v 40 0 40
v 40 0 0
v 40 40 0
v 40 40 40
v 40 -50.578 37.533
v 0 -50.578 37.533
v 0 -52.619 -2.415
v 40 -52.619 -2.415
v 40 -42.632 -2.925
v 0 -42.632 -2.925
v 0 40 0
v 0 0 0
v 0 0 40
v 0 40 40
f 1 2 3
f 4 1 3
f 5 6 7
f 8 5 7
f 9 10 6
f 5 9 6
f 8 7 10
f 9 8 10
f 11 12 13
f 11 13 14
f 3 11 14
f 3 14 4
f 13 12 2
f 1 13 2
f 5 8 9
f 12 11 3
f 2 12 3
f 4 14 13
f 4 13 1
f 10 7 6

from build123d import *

# Parameters (mm, degrees)
F0_W     = 40
F0_H     = 40
F1_DEPTH = 40
F3_DEPTH = 40


with BuildPart() as f1:
    # F0 (on Top) → F1 (new body)
    with BuildSketch(Plane.XY):
        with Locations((20, 20)):
            Rectangle(F0_W, F0_H)
    extrude(amount=F1_DEPTH)


with BuildPart() as f3:
    # F2 (on Right) → F3 (new body)
    with BuildSketch(Plane.YZ):
        Polygon((-42.632059, -2.924834), (-50.577897, 37.533338), (-52.619031, -2.41455), align=None)
    extrude(amount=F3_DEPTH)


solid = Compound([f1.part, f3.part])
